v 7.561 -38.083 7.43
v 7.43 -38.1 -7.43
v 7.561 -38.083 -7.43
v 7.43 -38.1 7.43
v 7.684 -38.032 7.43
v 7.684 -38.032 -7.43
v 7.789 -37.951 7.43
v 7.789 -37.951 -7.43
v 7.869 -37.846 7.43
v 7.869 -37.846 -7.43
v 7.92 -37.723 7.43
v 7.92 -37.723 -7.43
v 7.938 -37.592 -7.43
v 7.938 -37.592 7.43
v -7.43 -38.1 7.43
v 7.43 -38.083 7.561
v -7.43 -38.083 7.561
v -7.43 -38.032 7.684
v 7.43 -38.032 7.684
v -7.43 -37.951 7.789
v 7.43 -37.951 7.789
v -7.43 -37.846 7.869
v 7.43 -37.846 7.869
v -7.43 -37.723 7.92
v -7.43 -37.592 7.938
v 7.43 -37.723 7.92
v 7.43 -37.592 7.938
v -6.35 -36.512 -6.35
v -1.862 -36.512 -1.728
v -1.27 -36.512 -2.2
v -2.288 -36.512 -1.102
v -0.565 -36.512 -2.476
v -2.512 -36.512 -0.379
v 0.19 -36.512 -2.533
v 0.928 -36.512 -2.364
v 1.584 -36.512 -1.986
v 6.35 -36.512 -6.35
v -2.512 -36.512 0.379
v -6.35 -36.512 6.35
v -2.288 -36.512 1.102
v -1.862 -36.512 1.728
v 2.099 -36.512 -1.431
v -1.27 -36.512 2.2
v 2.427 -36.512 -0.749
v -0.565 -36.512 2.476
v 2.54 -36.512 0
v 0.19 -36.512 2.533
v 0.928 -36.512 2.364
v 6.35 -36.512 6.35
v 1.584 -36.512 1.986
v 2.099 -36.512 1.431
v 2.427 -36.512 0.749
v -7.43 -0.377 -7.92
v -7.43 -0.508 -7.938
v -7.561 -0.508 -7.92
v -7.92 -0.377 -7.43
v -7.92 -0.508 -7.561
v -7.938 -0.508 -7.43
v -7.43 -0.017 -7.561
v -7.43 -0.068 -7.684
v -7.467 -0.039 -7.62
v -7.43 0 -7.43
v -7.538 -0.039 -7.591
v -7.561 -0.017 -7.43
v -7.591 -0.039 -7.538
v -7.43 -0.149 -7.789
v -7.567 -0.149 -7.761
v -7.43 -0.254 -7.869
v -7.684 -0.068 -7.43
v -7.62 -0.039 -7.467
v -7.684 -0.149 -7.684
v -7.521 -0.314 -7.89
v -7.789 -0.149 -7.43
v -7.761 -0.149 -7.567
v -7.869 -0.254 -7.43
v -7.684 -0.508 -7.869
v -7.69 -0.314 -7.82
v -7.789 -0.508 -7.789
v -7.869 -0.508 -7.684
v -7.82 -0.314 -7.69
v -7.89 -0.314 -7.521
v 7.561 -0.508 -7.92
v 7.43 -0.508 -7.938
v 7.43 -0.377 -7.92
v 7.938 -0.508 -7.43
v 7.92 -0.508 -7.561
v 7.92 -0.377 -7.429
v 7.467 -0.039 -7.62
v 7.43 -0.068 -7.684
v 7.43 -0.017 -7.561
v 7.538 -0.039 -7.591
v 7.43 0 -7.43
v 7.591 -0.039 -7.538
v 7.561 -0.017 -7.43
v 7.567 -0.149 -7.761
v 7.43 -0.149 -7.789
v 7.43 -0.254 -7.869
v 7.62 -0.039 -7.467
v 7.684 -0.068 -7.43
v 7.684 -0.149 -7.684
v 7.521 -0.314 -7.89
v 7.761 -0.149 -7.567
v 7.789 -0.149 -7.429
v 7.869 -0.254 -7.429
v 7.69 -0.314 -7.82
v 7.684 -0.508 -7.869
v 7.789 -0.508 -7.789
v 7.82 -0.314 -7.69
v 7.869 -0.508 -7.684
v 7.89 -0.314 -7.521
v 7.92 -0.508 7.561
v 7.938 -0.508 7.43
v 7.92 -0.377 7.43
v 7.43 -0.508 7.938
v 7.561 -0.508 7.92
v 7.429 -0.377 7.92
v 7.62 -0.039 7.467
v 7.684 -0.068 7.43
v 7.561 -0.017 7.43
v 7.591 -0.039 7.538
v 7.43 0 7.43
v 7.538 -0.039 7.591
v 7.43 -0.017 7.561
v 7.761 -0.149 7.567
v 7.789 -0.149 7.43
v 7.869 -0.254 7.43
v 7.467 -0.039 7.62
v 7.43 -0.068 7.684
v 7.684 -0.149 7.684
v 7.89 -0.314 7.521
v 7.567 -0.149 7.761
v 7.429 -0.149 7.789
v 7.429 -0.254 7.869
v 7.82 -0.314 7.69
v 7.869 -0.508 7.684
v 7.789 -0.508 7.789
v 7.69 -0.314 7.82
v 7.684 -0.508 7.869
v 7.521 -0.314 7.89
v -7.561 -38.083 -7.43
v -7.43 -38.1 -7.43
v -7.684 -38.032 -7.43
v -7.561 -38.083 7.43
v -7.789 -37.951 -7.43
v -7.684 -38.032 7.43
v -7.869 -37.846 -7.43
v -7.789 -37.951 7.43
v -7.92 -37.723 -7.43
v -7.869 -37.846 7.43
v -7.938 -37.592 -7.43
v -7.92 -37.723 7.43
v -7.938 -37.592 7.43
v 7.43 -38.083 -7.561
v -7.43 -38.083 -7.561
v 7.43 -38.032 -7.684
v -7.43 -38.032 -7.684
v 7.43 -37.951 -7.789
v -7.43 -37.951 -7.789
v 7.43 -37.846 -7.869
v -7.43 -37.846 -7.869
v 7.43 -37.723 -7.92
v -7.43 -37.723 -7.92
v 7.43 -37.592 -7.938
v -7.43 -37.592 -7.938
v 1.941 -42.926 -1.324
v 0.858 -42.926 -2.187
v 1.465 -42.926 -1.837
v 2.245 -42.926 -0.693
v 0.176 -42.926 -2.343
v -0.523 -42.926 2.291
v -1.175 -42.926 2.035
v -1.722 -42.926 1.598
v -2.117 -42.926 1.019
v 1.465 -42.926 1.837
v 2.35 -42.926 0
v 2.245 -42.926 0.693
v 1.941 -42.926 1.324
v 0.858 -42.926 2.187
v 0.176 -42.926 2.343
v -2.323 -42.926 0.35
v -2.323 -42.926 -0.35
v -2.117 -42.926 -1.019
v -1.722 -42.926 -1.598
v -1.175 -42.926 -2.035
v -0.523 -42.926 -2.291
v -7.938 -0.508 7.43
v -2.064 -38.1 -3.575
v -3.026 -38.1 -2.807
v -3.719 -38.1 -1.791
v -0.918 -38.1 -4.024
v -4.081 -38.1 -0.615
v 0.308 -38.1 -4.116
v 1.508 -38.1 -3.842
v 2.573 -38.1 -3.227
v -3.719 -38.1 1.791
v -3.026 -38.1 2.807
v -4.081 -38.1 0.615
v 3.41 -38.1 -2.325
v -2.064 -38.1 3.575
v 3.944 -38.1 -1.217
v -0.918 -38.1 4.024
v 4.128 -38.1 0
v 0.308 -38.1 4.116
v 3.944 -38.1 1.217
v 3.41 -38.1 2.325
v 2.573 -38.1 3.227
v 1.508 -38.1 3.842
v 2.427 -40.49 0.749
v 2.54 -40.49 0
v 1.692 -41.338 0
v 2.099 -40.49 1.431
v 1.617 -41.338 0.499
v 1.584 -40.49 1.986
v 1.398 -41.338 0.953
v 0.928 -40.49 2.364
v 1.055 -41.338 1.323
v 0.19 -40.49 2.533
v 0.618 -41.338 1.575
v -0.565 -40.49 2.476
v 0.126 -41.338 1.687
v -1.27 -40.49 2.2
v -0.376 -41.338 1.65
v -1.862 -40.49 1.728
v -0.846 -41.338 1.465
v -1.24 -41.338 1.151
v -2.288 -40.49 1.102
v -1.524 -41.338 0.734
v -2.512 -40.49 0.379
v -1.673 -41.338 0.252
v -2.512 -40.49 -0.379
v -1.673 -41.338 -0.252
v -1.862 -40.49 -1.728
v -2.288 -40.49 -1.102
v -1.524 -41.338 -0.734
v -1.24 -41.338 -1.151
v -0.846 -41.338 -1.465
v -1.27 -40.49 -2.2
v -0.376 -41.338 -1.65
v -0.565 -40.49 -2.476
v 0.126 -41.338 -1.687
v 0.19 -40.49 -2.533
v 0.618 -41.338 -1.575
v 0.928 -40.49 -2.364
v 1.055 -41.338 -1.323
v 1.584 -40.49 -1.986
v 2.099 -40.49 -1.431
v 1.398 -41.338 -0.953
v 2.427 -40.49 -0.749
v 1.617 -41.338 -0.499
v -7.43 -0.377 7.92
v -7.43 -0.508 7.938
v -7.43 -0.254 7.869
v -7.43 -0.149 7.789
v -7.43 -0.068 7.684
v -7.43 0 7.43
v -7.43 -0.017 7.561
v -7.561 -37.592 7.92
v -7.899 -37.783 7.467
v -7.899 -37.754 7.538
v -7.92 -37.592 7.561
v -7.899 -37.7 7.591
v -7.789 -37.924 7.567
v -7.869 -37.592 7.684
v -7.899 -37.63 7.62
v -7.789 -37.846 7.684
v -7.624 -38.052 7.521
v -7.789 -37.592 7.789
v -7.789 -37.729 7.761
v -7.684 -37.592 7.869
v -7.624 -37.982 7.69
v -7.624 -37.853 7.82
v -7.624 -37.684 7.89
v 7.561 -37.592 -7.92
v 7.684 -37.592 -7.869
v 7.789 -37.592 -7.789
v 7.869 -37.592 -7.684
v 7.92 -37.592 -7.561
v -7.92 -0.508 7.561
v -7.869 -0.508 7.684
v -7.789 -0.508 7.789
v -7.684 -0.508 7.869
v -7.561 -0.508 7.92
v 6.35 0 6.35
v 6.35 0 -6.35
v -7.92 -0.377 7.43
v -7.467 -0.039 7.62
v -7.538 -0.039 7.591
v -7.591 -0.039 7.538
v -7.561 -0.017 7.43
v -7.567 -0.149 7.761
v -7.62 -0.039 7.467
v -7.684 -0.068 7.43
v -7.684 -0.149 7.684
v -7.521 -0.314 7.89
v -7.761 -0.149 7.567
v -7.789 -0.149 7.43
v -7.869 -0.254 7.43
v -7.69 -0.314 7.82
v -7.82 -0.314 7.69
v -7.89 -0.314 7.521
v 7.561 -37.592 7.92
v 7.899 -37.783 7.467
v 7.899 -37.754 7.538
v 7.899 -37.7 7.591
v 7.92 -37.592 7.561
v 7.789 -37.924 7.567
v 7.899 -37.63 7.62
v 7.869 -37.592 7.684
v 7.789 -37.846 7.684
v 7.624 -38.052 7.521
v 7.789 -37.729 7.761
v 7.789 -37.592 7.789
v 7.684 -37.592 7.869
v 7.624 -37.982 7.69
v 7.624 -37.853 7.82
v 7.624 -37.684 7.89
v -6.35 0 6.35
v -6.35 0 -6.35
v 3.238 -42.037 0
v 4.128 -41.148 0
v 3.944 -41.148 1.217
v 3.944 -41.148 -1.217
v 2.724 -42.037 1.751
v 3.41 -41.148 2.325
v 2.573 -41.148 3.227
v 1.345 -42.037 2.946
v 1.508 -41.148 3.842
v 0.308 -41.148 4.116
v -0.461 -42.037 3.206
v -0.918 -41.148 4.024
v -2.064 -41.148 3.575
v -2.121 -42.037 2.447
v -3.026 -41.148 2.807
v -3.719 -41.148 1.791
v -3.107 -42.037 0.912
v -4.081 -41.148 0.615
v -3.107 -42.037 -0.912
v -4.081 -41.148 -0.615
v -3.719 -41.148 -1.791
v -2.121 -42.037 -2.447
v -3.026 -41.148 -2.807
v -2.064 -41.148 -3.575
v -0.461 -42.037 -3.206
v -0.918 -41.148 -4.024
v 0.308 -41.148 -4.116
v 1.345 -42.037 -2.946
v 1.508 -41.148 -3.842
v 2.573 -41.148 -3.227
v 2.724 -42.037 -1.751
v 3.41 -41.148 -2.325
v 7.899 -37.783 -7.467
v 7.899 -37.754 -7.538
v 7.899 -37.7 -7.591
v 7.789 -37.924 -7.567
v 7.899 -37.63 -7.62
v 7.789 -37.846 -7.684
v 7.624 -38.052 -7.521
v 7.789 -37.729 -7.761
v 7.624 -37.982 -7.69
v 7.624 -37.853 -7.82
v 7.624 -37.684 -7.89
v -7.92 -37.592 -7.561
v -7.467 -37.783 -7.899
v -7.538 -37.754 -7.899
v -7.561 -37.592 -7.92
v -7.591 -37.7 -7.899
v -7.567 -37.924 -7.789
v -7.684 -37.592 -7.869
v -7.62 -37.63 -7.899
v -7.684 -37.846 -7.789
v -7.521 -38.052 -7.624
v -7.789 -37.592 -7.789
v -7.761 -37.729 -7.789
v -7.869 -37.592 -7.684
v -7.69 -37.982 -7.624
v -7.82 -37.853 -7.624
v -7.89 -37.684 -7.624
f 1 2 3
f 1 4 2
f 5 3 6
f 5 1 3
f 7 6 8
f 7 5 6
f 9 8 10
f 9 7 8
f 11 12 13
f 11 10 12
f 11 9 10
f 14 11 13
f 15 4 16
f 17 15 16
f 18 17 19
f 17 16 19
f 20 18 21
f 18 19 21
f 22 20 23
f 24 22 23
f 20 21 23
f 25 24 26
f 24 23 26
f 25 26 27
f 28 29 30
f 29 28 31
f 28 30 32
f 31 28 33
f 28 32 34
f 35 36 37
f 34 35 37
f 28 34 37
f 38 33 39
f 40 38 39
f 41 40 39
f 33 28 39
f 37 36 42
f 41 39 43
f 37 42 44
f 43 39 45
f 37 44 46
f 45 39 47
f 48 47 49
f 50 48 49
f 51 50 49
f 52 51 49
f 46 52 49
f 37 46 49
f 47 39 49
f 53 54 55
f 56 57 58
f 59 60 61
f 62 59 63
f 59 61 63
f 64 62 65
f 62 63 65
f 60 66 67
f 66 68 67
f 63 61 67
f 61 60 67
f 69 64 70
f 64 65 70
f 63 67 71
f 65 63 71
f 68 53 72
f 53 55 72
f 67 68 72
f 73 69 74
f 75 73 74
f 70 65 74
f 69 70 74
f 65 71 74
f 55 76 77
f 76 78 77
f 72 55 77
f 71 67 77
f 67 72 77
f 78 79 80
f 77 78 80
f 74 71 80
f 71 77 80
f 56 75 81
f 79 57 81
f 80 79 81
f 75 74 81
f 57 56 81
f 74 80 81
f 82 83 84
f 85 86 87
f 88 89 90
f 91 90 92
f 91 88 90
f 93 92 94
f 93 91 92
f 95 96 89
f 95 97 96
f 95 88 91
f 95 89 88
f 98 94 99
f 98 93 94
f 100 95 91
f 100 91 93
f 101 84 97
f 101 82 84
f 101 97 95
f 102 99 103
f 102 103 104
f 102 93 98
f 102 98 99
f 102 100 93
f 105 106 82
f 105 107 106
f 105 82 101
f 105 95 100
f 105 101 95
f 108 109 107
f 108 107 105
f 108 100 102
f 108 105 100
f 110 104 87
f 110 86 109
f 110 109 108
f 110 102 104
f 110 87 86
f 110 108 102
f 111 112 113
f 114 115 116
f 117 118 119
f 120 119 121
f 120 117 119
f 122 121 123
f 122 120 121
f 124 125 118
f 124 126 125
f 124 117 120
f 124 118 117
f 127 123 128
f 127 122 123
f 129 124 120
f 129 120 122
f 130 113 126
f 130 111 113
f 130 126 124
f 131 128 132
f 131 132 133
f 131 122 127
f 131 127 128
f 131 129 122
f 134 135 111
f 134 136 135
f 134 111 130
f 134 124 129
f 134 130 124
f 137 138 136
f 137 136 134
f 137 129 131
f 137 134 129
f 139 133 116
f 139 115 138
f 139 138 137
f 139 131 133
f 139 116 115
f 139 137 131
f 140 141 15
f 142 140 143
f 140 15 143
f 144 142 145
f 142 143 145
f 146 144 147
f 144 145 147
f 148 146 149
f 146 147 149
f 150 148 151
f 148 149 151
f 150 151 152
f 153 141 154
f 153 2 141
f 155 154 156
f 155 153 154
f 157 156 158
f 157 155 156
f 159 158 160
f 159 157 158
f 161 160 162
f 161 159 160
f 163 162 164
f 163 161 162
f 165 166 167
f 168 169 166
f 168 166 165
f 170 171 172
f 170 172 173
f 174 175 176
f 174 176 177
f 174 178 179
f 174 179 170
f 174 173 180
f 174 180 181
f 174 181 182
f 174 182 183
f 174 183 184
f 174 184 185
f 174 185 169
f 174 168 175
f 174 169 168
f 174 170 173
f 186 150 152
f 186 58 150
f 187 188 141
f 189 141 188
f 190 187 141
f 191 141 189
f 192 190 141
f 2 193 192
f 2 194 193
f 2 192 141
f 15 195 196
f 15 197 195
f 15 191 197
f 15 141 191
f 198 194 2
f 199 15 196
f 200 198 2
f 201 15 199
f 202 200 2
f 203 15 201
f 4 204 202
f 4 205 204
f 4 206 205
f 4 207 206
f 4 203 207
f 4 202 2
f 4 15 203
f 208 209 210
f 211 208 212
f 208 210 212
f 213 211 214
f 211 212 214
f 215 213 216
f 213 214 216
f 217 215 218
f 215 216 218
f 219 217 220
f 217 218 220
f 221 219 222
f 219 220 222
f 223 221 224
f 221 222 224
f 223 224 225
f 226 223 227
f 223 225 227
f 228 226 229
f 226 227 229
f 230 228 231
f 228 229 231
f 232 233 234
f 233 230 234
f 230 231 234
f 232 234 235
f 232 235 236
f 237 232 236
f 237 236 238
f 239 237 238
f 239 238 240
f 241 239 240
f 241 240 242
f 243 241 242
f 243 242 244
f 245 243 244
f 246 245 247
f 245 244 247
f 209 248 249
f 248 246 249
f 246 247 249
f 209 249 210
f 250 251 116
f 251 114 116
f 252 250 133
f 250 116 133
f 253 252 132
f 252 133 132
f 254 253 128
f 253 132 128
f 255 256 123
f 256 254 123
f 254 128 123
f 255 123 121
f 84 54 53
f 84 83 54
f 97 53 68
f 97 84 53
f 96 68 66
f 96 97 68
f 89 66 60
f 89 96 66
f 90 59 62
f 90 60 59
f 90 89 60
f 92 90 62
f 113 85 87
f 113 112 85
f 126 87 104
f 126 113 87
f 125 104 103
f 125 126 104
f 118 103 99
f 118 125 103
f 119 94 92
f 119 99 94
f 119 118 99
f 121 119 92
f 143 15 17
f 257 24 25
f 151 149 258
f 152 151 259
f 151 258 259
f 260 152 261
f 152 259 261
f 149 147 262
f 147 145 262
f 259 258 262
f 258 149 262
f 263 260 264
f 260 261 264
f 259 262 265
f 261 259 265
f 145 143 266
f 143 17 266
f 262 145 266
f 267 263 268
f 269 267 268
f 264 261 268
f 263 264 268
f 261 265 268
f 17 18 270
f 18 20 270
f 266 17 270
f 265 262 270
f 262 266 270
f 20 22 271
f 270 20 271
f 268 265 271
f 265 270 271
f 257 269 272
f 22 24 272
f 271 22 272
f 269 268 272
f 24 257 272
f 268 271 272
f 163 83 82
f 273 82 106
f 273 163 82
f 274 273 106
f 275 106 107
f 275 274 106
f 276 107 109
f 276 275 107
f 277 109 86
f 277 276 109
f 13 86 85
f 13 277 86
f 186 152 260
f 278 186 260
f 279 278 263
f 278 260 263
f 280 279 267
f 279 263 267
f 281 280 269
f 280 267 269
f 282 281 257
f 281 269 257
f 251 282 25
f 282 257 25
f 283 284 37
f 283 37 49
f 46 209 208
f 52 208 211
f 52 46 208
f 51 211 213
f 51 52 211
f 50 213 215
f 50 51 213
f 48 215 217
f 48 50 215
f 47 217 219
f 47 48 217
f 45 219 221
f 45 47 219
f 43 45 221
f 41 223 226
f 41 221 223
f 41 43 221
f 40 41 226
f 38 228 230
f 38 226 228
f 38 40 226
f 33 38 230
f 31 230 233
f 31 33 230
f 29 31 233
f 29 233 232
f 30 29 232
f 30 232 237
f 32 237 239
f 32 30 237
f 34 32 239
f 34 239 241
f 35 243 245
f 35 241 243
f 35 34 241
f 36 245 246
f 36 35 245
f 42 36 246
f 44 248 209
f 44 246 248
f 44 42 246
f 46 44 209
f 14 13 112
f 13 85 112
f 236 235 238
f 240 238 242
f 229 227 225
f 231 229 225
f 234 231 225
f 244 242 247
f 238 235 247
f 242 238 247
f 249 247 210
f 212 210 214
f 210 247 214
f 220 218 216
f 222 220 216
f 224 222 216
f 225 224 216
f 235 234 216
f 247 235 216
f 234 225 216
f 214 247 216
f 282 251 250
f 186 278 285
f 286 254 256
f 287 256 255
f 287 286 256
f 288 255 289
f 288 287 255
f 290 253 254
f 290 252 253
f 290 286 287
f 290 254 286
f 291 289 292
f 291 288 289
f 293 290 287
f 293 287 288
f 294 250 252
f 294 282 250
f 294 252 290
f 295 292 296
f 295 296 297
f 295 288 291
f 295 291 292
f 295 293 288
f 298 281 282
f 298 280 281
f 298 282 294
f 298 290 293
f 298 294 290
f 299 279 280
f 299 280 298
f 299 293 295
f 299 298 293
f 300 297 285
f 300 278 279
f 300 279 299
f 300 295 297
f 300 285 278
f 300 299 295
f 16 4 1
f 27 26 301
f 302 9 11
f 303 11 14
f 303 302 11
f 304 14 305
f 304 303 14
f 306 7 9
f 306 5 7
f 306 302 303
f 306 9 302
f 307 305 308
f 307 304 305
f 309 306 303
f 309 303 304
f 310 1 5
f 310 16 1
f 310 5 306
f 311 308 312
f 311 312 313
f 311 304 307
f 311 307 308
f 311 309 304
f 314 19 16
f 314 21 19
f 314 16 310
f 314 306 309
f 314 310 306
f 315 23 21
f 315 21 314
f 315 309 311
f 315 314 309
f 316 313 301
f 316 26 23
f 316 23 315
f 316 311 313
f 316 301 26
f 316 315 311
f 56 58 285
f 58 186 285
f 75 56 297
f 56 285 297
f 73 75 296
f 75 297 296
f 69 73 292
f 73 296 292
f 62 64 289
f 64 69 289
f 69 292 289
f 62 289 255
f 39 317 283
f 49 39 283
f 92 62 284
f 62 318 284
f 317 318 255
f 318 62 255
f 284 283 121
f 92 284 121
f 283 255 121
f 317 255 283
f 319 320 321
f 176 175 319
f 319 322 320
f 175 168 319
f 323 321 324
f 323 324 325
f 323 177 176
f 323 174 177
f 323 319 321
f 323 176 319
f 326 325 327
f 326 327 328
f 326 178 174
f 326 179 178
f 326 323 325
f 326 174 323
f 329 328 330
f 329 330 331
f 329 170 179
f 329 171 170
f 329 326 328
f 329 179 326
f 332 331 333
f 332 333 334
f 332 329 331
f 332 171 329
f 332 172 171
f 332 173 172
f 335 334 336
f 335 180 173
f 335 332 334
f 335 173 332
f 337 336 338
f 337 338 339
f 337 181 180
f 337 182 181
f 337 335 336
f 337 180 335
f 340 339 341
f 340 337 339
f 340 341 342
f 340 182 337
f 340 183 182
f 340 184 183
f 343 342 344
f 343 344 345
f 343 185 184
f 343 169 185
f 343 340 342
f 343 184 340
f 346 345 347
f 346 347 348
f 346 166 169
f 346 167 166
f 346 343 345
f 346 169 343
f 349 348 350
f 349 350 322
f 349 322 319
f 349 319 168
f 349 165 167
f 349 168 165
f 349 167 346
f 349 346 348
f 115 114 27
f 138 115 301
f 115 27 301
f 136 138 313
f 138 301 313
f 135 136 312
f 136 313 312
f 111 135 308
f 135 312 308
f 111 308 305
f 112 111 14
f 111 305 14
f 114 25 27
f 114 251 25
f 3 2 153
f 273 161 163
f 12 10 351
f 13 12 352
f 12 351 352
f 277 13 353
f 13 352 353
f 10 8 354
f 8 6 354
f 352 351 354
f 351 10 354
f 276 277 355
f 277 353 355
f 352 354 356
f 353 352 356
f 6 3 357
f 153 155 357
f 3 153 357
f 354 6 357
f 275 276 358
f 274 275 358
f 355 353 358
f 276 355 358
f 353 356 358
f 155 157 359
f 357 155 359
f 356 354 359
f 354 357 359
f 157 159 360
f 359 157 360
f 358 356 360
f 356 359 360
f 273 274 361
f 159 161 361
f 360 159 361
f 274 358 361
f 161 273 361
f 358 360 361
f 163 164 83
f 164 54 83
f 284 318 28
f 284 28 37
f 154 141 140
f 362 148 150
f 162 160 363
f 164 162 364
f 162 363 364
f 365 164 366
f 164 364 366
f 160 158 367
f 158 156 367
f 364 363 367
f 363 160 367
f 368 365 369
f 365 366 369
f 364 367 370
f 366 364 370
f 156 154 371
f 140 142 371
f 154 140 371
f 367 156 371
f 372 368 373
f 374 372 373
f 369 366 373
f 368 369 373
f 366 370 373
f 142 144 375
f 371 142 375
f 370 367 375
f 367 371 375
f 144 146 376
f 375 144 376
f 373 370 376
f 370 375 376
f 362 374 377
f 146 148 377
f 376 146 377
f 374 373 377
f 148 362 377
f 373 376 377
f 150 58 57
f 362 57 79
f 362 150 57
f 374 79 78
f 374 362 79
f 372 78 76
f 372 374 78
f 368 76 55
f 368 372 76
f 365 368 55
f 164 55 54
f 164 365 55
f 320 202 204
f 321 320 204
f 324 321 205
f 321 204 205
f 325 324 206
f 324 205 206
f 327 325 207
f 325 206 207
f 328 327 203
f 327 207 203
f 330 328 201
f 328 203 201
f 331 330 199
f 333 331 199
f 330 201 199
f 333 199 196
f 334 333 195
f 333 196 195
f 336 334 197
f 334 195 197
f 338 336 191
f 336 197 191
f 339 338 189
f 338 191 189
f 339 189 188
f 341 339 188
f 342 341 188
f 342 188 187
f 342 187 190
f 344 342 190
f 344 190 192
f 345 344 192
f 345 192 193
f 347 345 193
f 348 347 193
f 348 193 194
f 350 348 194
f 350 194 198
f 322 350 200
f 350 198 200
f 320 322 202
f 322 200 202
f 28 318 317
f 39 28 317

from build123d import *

# Parameters (mm, degrees)
F0_W     = 15.875
F0_H     = 15.875
F1_DEPTH = 38.1
F2_R     = 4.1275
F3_DEPTH = 4.826
F4_SIZE  = 1.778
F5_T     = -1.5875
F6_R     = 0.508


with BuildPart() as f1:
    # F0 (on Front) → F1 (new body)
    with BuildSketch(Plane.XZ):
        Rectangle(F0_W, F0_H)
    extrude(amount=F1_DEPTH)

    # F2 (on face) → F3 (join)
    with BuildSketch(Plane.XZ.offset(38.1)):
        Circle(F2_R)
    extrude(amount=F3_DEPTH)

    # F4
    f4_edges = [f1.edges().sort_by_distance(p)[0] for p in [
        (-4.1275, -42.926, 0),
    ]]
    chamfer(f4_edges, length=F4_SIZE)

    # F5
    f5_openings = [f1.faces().sort_by_distance(p)[0] for p in [
        (0, 0, 0),
    ]]
    offset(amount=F5_T, openings=f5_openings, kind=Kind.INTERSECTION)

    # F6
    f6_edges = [f1.edges().sort_by_distance(p)[0] for p in [
        (0, -38.1, 7.9375),
        (-7.9375, -38.1, 0),
        (0, -38.1, -7.9375),
        (7.9375, -38.1, 0),
        (-7.9375, -19.05, 7.9375),
        (-7.9375, -19.05, -7.9375),
        (7.9375, -19.05, 7.9375),
        (7.9375, -19.05, -7.9375),
        (0, 0, -7.9375),
        (7.9375, 0, 0),
        (0, 0, 7.9375),
        (-7.9375, 0, 0),
    ]]
    fillet(f6_edges, radius=F6_R)


solid = f1.part
